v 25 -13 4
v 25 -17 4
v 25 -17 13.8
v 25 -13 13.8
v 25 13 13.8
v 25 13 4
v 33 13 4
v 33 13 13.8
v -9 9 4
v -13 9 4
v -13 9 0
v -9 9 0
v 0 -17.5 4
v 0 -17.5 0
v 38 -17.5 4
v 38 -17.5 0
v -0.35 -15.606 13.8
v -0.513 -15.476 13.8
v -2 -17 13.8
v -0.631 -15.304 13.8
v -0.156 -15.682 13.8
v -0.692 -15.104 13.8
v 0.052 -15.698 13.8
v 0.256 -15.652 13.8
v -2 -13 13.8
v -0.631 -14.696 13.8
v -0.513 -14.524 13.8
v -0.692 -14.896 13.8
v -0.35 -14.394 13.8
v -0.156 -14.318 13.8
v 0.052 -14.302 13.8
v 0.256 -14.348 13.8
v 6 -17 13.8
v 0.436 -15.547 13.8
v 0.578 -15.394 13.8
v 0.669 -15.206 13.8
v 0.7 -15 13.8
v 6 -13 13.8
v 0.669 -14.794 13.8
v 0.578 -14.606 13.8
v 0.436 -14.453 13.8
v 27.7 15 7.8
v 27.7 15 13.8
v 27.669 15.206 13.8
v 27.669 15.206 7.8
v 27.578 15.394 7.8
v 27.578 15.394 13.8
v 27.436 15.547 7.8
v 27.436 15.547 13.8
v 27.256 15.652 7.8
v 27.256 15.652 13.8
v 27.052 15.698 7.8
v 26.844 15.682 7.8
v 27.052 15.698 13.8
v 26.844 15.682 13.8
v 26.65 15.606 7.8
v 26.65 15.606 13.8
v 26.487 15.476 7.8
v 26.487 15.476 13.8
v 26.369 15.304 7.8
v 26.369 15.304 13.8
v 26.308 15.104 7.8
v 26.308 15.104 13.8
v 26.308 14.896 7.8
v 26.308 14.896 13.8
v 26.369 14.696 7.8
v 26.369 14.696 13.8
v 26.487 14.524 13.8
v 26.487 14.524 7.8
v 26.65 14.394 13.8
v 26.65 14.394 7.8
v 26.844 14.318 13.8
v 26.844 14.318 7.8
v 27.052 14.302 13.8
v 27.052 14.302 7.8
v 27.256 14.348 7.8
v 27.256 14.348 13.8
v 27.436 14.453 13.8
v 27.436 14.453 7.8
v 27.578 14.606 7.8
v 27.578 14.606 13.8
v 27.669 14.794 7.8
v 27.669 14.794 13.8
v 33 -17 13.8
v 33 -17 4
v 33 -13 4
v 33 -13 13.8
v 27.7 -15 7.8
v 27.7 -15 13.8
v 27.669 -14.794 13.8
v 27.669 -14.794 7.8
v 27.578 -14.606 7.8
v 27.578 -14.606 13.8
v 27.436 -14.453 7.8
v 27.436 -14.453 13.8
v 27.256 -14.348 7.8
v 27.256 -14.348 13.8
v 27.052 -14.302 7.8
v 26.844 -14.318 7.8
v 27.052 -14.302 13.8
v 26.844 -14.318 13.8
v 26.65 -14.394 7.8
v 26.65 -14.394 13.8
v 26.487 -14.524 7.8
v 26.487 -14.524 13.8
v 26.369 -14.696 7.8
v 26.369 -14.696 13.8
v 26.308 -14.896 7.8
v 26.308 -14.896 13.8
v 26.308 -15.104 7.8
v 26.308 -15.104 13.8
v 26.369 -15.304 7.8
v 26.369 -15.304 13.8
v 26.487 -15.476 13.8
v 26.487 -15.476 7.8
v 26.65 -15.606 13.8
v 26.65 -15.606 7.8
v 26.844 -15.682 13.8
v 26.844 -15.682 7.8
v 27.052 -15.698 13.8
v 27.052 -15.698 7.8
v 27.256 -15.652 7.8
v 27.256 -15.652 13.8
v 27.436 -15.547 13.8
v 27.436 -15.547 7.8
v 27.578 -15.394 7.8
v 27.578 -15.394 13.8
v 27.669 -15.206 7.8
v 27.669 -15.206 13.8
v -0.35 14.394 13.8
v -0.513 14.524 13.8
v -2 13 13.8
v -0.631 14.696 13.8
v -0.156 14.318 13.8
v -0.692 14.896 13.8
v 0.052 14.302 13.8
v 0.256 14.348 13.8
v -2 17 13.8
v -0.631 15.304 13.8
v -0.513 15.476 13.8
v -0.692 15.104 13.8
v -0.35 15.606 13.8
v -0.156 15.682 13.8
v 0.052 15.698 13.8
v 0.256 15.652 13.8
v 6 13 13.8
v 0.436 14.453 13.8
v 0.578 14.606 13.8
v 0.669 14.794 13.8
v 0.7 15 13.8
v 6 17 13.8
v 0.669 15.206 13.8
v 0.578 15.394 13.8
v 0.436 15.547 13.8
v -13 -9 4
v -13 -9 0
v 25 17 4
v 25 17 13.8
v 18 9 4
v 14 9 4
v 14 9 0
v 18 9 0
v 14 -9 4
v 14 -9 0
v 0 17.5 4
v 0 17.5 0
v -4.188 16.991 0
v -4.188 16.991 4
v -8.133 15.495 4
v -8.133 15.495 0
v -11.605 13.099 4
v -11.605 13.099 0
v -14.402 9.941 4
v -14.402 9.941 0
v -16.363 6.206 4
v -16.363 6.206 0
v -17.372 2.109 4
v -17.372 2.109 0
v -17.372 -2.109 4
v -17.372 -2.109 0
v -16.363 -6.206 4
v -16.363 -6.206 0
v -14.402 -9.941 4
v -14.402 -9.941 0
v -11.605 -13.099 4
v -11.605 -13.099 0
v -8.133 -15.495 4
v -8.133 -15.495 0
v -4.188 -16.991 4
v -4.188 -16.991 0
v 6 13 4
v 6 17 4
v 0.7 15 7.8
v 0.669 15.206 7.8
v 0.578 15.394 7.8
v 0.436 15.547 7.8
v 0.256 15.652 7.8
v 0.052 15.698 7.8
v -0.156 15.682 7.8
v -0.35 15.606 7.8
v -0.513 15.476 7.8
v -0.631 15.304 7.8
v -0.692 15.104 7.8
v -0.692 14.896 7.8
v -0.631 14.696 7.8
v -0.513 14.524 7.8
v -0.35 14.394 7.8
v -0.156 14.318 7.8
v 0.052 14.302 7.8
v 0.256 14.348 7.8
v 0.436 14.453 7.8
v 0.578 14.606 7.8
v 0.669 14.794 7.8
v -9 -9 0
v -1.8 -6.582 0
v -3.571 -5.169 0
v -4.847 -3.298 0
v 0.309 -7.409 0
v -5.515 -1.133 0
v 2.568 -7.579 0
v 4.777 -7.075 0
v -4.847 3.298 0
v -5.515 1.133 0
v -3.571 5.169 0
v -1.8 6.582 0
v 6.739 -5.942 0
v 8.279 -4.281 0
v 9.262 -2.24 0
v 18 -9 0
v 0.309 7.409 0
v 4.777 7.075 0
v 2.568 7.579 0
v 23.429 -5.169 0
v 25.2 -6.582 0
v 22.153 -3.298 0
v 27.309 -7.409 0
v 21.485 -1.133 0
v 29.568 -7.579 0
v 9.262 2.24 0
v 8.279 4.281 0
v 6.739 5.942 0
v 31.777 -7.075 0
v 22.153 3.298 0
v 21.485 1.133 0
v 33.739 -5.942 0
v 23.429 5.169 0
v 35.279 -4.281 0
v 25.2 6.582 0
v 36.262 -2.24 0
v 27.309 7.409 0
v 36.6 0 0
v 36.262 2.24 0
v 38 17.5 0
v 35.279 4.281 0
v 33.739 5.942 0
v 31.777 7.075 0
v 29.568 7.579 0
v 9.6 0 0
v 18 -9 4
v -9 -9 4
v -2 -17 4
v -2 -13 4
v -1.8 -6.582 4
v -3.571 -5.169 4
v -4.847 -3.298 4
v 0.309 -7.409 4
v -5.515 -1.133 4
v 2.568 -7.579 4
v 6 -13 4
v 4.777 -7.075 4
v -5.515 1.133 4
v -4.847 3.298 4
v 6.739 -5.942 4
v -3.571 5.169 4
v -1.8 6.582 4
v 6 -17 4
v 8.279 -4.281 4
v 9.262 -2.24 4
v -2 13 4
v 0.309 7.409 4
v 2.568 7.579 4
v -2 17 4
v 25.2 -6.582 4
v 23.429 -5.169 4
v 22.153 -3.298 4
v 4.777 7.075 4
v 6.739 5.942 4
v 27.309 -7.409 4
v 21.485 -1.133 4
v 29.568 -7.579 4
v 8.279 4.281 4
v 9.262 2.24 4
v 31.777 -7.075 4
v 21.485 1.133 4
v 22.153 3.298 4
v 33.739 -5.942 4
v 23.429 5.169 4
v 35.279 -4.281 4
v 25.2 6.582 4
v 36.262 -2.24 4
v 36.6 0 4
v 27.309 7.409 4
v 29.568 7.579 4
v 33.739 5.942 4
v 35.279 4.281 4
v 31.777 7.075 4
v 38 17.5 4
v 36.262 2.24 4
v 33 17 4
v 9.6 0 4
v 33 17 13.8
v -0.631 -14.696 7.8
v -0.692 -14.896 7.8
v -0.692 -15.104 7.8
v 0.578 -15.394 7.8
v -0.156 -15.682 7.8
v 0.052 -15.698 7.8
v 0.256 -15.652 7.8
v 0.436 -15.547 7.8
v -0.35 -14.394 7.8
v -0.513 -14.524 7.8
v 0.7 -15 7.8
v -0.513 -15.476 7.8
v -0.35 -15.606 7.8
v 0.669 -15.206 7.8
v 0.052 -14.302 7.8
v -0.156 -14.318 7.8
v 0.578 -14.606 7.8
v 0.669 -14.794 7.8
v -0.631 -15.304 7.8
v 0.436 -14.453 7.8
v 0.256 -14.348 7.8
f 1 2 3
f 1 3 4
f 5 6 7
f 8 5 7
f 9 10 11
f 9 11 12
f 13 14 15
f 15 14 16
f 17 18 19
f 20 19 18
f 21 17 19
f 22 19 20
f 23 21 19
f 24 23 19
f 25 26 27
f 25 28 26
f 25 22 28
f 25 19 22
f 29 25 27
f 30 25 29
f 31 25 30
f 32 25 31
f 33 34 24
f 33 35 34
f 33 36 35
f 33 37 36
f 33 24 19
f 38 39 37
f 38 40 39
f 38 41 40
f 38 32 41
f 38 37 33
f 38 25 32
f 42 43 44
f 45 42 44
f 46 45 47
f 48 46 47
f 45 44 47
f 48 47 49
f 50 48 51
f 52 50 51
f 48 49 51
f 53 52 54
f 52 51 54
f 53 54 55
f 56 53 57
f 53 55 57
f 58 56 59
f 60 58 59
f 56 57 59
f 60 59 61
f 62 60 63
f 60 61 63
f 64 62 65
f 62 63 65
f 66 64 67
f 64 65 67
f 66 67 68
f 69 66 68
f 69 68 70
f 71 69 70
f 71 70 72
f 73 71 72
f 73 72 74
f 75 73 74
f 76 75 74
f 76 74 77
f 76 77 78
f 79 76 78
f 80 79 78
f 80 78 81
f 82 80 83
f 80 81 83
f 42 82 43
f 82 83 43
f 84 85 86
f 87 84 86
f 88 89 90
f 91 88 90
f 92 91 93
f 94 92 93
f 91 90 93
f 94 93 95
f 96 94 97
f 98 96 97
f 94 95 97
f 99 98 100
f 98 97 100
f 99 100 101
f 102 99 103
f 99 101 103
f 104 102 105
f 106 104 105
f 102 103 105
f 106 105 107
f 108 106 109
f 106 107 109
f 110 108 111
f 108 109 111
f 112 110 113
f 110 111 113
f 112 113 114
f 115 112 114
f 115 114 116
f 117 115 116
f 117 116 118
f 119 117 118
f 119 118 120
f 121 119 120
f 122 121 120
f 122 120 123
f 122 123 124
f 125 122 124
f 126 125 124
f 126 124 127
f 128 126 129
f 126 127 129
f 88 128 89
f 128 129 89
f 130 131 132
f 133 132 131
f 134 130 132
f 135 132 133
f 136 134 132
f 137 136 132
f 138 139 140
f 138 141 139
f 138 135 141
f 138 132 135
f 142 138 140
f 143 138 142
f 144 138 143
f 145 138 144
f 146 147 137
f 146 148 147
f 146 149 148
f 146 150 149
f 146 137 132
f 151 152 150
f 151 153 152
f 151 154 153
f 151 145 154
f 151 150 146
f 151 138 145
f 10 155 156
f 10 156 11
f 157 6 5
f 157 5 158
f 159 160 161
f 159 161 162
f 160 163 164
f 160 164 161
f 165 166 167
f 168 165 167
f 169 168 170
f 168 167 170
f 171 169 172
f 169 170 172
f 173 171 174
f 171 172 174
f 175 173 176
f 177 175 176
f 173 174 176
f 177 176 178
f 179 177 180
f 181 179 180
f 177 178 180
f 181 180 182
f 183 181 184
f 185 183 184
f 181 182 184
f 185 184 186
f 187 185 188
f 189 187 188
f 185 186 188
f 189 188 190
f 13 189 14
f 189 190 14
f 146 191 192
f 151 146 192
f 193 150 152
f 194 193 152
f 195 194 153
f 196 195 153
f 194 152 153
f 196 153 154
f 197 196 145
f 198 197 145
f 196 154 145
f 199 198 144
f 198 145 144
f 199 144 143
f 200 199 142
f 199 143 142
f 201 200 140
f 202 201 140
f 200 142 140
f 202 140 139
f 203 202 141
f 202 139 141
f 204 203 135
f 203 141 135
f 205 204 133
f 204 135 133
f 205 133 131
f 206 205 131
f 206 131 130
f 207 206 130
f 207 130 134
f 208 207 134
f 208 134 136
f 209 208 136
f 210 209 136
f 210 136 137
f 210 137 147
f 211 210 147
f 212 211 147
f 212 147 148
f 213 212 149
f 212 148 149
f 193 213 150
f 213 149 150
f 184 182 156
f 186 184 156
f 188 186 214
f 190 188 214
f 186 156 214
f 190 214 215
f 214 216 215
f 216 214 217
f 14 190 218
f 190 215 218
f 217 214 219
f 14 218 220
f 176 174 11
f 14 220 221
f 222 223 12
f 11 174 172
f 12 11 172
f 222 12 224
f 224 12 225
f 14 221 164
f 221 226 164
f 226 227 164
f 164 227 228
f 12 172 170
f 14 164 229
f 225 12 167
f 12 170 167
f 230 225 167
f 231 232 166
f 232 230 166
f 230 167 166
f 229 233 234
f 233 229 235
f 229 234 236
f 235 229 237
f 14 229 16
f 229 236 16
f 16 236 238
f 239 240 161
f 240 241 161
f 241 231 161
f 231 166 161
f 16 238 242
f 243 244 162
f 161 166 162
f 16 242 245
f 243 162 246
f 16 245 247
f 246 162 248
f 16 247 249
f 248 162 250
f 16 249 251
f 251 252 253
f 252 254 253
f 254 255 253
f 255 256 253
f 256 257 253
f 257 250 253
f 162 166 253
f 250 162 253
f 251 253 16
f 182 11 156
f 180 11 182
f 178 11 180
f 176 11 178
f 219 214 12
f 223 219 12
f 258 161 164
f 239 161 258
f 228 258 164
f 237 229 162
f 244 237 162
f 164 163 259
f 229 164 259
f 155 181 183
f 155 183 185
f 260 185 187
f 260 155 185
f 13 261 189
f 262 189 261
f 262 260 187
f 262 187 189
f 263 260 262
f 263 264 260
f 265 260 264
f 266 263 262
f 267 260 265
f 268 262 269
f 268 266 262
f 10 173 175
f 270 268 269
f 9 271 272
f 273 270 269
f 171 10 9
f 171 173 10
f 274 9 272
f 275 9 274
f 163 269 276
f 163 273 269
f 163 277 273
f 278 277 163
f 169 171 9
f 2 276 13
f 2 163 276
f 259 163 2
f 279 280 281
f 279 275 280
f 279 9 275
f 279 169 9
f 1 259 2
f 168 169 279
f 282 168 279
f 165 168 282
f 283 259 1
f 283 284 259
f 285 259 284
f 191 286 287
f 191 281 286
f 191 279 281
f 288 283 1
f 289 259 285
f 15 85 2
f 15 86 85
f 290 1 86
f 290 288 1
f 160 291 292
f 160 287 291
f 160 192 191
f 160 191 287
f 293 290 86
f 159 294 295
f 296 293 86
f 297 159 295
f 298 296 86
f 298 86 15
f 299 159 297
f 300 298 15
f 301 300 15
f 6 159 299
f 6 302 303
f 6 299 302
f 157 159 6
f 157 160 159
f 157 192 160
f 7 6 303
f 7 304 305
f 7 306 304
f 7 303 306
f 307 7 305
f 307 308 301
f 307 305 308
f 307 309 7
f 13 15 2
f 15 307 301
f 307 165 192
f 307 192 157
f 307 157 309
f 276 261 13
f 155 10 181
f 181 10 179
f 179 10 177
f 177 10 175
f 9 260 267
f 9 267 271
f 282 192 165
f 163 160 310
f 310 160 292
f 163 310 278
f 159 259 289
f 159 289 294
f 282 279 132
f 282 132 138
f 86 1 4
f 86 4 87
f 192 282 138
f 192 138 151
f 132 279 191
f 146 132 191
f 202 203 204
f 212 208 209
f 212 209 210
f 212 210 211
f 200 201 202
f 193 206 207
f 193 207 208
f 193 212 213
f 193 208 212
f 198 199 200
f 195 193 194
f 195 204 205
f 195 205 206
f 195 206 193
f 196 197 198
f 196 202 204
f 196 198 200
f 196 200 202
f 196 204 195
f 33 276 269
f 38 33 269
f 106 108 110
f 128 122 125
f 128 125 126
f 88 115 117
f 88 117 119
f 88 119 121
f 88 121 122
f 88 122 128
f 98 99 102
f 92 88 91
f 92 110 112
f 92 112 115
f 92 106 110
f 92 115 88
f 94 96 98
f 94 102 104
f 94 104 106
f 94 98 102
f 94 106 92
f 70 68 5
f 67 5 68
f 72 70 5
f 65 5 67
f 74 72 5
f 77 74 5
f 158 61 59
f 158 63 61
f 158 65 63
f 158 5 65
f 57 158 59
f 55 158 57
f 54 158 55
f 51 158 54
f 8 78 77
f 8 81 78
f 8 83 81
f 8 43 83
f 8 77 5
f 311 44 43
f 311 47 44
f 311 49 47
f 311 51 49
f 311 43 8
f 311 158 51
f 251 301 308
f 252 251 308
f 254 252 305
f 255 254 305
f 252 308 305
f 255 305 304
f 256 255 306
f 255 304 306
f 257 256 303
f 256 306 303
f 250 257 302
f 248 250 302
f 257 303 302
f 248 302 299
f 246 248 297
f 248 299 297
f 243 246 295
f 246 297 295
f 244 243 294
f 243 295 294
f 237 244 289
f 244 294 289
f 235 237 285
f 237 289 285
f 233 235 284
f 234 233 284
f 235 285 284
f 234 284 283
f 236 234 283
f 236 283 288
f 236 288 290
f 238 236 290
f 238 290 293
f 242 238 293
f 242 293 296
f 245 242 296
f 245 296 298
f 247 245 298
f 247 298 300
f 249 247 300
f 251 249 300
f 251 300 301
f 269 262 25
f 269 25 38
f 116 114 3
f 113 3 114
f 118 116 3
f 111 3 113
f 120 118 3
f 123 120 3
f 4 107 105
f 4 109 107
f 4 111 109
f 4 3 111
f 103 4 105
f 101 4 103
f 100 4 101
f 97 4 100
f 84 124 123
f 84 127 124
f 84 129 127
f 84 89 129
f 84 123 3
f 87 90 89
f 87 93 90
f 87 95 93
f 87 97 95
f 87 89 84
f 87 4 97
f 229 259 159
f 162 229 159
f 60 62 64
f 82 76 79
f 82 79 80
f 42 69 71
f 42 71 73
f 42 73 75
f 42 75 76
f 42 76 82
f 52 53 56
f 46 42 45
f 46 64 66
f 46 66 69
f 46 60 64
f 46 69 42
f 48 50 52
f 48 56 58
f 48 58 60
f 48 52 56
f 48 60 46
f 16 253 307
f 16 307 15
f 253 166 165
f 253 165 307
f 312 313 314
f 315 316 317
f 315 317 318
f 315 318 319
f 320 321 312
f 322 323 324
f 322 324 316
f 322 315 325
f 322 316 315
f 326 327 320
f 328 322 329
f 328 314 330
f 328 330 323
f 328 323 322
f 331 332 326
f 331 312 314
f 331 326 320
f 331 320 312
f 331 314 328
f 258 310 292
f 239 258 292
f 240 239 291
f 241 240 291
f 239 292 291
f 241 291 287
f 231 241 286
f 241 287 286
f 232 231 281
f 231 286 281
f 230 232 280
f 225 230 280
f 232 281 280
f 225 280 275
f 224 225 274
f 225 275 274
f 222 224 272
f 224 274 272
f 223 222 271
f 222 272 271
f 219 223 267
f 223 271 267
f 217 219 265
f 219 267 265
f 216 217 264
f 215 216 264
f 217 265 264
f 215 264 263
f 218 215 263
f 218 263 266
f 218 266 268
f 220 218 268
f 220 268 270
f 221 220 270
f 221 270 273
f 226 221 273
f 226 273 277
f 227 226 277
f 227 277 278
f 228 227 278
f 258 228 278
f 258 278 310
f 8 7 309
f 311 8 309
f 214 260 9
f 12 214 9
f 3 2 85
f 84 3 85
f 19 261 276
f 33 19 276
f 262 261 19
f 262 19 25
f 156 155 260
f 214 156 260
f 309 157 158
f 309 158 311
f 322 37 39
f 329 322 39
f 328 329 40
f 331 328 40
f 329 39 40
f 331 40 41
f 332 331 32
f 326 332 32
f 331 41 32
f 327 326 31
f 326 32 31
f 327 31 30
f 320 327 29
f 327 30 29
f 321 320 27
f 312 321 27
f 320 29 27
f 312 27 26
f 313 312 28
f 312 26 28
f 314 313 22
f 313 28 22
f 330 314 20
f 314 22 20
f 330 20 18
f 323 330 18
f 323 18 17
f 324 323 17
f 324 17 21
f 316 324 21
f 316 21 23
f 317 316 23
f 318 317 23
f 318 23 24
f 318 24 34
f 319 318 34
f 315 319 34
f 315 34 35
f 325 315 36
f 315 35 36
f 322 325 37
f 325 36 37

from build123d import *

# Parameters (mm, degrees)
PAD_DEPTH       = 4
SKETCH001_W     = 8
SKETCH001_H     = 4
PAD001_DEPTH    = 9.8
SKETCH002_R     = 7.6
POCKET_DEPTH    = 5
SKETCH003_R     = 0.7
POCKET001_DEPTH = 6
SKETCH004_W     = 4
SKETCH004_H     = 18
POCKET002_DEPTH = 5


with BuildPart() as part:
    # Sketch → Pad (new body)
    with BuildSketch(Plane.XY):
        with BuildLine():
            ThreePointArc((-3e-06, 17.5), (-17.5, -1.8e-05), (3.3e-05, -17.5))
            Line((3.3e-05, -17.5), (38, -17.5))
            Line((38, 17.500005), (38, -17.5))
            Line((-3e-06, 17.5), (38, 17.500005))
        make_face()
    extrude(amount=PAD_DEPTH)

    # Sketch001 → Pad001 (new body)
    with BuildSketch(Plane.XY.offset(4)):
        with Locations((2, 15)):
            Rectangle(SKETCH001_W, SKETCH001_H)
        with Locations((2, -15)):
            Rectangle(SKETCH001_W, SKETCH001_H)
        with Locations((29, 15)):
            Rectangle(SKETCH001_W, SKETCH001_H)
        with Locations((29, -15)):
            Rectangle(SKETCH001_W, SKETCH001_H)
    extrude(amount=PAD001_DEPTH)

    # Sketch002 → Pocket (cut)
    with BuildSketch(Plane.XY.offset(4)):
        with Locations((2, 0)):
            Circle(SKETCH002_R)
        with Locations((29, 0)):
            Circle(SKETCH002_R)
    extrude(amount=-POCKET_DEPTH, mode=Mode.SUBTRACT)

    # Sketch003 → Pocket001 (cut)
    with BuildSketch(Plane.XY.offset(13.8)):
        with Locations((0, 15)):
            Circle(SKETCH003_R)
        with Locations((27, 15)):
            Circle(SKETCH003_R)
        with Locations((27, -15)):
            Circle(SKETCH003_R)
        with Locations((0, -15)):
            Circle(SKETCH003_R)
    extrude(amount=-POCKET001_DEPTH, mode=Mode.SUBTRACT)

    # Sketch004 → Pocket002 (cut)
    with BuildSketch(Plane.XY.offset(4)):
        with Locations((-11, 0)):
            Rectangle(SKETCH004_W, SKETCH004_H)
        with Locations((16, 0)):
            Rectangle(SKETCH004_W, SKETCH004_H)
    extrude(amount=-POCKET002_DEPTH, mode=Mode.SUBTRACT)


solid = part.part
